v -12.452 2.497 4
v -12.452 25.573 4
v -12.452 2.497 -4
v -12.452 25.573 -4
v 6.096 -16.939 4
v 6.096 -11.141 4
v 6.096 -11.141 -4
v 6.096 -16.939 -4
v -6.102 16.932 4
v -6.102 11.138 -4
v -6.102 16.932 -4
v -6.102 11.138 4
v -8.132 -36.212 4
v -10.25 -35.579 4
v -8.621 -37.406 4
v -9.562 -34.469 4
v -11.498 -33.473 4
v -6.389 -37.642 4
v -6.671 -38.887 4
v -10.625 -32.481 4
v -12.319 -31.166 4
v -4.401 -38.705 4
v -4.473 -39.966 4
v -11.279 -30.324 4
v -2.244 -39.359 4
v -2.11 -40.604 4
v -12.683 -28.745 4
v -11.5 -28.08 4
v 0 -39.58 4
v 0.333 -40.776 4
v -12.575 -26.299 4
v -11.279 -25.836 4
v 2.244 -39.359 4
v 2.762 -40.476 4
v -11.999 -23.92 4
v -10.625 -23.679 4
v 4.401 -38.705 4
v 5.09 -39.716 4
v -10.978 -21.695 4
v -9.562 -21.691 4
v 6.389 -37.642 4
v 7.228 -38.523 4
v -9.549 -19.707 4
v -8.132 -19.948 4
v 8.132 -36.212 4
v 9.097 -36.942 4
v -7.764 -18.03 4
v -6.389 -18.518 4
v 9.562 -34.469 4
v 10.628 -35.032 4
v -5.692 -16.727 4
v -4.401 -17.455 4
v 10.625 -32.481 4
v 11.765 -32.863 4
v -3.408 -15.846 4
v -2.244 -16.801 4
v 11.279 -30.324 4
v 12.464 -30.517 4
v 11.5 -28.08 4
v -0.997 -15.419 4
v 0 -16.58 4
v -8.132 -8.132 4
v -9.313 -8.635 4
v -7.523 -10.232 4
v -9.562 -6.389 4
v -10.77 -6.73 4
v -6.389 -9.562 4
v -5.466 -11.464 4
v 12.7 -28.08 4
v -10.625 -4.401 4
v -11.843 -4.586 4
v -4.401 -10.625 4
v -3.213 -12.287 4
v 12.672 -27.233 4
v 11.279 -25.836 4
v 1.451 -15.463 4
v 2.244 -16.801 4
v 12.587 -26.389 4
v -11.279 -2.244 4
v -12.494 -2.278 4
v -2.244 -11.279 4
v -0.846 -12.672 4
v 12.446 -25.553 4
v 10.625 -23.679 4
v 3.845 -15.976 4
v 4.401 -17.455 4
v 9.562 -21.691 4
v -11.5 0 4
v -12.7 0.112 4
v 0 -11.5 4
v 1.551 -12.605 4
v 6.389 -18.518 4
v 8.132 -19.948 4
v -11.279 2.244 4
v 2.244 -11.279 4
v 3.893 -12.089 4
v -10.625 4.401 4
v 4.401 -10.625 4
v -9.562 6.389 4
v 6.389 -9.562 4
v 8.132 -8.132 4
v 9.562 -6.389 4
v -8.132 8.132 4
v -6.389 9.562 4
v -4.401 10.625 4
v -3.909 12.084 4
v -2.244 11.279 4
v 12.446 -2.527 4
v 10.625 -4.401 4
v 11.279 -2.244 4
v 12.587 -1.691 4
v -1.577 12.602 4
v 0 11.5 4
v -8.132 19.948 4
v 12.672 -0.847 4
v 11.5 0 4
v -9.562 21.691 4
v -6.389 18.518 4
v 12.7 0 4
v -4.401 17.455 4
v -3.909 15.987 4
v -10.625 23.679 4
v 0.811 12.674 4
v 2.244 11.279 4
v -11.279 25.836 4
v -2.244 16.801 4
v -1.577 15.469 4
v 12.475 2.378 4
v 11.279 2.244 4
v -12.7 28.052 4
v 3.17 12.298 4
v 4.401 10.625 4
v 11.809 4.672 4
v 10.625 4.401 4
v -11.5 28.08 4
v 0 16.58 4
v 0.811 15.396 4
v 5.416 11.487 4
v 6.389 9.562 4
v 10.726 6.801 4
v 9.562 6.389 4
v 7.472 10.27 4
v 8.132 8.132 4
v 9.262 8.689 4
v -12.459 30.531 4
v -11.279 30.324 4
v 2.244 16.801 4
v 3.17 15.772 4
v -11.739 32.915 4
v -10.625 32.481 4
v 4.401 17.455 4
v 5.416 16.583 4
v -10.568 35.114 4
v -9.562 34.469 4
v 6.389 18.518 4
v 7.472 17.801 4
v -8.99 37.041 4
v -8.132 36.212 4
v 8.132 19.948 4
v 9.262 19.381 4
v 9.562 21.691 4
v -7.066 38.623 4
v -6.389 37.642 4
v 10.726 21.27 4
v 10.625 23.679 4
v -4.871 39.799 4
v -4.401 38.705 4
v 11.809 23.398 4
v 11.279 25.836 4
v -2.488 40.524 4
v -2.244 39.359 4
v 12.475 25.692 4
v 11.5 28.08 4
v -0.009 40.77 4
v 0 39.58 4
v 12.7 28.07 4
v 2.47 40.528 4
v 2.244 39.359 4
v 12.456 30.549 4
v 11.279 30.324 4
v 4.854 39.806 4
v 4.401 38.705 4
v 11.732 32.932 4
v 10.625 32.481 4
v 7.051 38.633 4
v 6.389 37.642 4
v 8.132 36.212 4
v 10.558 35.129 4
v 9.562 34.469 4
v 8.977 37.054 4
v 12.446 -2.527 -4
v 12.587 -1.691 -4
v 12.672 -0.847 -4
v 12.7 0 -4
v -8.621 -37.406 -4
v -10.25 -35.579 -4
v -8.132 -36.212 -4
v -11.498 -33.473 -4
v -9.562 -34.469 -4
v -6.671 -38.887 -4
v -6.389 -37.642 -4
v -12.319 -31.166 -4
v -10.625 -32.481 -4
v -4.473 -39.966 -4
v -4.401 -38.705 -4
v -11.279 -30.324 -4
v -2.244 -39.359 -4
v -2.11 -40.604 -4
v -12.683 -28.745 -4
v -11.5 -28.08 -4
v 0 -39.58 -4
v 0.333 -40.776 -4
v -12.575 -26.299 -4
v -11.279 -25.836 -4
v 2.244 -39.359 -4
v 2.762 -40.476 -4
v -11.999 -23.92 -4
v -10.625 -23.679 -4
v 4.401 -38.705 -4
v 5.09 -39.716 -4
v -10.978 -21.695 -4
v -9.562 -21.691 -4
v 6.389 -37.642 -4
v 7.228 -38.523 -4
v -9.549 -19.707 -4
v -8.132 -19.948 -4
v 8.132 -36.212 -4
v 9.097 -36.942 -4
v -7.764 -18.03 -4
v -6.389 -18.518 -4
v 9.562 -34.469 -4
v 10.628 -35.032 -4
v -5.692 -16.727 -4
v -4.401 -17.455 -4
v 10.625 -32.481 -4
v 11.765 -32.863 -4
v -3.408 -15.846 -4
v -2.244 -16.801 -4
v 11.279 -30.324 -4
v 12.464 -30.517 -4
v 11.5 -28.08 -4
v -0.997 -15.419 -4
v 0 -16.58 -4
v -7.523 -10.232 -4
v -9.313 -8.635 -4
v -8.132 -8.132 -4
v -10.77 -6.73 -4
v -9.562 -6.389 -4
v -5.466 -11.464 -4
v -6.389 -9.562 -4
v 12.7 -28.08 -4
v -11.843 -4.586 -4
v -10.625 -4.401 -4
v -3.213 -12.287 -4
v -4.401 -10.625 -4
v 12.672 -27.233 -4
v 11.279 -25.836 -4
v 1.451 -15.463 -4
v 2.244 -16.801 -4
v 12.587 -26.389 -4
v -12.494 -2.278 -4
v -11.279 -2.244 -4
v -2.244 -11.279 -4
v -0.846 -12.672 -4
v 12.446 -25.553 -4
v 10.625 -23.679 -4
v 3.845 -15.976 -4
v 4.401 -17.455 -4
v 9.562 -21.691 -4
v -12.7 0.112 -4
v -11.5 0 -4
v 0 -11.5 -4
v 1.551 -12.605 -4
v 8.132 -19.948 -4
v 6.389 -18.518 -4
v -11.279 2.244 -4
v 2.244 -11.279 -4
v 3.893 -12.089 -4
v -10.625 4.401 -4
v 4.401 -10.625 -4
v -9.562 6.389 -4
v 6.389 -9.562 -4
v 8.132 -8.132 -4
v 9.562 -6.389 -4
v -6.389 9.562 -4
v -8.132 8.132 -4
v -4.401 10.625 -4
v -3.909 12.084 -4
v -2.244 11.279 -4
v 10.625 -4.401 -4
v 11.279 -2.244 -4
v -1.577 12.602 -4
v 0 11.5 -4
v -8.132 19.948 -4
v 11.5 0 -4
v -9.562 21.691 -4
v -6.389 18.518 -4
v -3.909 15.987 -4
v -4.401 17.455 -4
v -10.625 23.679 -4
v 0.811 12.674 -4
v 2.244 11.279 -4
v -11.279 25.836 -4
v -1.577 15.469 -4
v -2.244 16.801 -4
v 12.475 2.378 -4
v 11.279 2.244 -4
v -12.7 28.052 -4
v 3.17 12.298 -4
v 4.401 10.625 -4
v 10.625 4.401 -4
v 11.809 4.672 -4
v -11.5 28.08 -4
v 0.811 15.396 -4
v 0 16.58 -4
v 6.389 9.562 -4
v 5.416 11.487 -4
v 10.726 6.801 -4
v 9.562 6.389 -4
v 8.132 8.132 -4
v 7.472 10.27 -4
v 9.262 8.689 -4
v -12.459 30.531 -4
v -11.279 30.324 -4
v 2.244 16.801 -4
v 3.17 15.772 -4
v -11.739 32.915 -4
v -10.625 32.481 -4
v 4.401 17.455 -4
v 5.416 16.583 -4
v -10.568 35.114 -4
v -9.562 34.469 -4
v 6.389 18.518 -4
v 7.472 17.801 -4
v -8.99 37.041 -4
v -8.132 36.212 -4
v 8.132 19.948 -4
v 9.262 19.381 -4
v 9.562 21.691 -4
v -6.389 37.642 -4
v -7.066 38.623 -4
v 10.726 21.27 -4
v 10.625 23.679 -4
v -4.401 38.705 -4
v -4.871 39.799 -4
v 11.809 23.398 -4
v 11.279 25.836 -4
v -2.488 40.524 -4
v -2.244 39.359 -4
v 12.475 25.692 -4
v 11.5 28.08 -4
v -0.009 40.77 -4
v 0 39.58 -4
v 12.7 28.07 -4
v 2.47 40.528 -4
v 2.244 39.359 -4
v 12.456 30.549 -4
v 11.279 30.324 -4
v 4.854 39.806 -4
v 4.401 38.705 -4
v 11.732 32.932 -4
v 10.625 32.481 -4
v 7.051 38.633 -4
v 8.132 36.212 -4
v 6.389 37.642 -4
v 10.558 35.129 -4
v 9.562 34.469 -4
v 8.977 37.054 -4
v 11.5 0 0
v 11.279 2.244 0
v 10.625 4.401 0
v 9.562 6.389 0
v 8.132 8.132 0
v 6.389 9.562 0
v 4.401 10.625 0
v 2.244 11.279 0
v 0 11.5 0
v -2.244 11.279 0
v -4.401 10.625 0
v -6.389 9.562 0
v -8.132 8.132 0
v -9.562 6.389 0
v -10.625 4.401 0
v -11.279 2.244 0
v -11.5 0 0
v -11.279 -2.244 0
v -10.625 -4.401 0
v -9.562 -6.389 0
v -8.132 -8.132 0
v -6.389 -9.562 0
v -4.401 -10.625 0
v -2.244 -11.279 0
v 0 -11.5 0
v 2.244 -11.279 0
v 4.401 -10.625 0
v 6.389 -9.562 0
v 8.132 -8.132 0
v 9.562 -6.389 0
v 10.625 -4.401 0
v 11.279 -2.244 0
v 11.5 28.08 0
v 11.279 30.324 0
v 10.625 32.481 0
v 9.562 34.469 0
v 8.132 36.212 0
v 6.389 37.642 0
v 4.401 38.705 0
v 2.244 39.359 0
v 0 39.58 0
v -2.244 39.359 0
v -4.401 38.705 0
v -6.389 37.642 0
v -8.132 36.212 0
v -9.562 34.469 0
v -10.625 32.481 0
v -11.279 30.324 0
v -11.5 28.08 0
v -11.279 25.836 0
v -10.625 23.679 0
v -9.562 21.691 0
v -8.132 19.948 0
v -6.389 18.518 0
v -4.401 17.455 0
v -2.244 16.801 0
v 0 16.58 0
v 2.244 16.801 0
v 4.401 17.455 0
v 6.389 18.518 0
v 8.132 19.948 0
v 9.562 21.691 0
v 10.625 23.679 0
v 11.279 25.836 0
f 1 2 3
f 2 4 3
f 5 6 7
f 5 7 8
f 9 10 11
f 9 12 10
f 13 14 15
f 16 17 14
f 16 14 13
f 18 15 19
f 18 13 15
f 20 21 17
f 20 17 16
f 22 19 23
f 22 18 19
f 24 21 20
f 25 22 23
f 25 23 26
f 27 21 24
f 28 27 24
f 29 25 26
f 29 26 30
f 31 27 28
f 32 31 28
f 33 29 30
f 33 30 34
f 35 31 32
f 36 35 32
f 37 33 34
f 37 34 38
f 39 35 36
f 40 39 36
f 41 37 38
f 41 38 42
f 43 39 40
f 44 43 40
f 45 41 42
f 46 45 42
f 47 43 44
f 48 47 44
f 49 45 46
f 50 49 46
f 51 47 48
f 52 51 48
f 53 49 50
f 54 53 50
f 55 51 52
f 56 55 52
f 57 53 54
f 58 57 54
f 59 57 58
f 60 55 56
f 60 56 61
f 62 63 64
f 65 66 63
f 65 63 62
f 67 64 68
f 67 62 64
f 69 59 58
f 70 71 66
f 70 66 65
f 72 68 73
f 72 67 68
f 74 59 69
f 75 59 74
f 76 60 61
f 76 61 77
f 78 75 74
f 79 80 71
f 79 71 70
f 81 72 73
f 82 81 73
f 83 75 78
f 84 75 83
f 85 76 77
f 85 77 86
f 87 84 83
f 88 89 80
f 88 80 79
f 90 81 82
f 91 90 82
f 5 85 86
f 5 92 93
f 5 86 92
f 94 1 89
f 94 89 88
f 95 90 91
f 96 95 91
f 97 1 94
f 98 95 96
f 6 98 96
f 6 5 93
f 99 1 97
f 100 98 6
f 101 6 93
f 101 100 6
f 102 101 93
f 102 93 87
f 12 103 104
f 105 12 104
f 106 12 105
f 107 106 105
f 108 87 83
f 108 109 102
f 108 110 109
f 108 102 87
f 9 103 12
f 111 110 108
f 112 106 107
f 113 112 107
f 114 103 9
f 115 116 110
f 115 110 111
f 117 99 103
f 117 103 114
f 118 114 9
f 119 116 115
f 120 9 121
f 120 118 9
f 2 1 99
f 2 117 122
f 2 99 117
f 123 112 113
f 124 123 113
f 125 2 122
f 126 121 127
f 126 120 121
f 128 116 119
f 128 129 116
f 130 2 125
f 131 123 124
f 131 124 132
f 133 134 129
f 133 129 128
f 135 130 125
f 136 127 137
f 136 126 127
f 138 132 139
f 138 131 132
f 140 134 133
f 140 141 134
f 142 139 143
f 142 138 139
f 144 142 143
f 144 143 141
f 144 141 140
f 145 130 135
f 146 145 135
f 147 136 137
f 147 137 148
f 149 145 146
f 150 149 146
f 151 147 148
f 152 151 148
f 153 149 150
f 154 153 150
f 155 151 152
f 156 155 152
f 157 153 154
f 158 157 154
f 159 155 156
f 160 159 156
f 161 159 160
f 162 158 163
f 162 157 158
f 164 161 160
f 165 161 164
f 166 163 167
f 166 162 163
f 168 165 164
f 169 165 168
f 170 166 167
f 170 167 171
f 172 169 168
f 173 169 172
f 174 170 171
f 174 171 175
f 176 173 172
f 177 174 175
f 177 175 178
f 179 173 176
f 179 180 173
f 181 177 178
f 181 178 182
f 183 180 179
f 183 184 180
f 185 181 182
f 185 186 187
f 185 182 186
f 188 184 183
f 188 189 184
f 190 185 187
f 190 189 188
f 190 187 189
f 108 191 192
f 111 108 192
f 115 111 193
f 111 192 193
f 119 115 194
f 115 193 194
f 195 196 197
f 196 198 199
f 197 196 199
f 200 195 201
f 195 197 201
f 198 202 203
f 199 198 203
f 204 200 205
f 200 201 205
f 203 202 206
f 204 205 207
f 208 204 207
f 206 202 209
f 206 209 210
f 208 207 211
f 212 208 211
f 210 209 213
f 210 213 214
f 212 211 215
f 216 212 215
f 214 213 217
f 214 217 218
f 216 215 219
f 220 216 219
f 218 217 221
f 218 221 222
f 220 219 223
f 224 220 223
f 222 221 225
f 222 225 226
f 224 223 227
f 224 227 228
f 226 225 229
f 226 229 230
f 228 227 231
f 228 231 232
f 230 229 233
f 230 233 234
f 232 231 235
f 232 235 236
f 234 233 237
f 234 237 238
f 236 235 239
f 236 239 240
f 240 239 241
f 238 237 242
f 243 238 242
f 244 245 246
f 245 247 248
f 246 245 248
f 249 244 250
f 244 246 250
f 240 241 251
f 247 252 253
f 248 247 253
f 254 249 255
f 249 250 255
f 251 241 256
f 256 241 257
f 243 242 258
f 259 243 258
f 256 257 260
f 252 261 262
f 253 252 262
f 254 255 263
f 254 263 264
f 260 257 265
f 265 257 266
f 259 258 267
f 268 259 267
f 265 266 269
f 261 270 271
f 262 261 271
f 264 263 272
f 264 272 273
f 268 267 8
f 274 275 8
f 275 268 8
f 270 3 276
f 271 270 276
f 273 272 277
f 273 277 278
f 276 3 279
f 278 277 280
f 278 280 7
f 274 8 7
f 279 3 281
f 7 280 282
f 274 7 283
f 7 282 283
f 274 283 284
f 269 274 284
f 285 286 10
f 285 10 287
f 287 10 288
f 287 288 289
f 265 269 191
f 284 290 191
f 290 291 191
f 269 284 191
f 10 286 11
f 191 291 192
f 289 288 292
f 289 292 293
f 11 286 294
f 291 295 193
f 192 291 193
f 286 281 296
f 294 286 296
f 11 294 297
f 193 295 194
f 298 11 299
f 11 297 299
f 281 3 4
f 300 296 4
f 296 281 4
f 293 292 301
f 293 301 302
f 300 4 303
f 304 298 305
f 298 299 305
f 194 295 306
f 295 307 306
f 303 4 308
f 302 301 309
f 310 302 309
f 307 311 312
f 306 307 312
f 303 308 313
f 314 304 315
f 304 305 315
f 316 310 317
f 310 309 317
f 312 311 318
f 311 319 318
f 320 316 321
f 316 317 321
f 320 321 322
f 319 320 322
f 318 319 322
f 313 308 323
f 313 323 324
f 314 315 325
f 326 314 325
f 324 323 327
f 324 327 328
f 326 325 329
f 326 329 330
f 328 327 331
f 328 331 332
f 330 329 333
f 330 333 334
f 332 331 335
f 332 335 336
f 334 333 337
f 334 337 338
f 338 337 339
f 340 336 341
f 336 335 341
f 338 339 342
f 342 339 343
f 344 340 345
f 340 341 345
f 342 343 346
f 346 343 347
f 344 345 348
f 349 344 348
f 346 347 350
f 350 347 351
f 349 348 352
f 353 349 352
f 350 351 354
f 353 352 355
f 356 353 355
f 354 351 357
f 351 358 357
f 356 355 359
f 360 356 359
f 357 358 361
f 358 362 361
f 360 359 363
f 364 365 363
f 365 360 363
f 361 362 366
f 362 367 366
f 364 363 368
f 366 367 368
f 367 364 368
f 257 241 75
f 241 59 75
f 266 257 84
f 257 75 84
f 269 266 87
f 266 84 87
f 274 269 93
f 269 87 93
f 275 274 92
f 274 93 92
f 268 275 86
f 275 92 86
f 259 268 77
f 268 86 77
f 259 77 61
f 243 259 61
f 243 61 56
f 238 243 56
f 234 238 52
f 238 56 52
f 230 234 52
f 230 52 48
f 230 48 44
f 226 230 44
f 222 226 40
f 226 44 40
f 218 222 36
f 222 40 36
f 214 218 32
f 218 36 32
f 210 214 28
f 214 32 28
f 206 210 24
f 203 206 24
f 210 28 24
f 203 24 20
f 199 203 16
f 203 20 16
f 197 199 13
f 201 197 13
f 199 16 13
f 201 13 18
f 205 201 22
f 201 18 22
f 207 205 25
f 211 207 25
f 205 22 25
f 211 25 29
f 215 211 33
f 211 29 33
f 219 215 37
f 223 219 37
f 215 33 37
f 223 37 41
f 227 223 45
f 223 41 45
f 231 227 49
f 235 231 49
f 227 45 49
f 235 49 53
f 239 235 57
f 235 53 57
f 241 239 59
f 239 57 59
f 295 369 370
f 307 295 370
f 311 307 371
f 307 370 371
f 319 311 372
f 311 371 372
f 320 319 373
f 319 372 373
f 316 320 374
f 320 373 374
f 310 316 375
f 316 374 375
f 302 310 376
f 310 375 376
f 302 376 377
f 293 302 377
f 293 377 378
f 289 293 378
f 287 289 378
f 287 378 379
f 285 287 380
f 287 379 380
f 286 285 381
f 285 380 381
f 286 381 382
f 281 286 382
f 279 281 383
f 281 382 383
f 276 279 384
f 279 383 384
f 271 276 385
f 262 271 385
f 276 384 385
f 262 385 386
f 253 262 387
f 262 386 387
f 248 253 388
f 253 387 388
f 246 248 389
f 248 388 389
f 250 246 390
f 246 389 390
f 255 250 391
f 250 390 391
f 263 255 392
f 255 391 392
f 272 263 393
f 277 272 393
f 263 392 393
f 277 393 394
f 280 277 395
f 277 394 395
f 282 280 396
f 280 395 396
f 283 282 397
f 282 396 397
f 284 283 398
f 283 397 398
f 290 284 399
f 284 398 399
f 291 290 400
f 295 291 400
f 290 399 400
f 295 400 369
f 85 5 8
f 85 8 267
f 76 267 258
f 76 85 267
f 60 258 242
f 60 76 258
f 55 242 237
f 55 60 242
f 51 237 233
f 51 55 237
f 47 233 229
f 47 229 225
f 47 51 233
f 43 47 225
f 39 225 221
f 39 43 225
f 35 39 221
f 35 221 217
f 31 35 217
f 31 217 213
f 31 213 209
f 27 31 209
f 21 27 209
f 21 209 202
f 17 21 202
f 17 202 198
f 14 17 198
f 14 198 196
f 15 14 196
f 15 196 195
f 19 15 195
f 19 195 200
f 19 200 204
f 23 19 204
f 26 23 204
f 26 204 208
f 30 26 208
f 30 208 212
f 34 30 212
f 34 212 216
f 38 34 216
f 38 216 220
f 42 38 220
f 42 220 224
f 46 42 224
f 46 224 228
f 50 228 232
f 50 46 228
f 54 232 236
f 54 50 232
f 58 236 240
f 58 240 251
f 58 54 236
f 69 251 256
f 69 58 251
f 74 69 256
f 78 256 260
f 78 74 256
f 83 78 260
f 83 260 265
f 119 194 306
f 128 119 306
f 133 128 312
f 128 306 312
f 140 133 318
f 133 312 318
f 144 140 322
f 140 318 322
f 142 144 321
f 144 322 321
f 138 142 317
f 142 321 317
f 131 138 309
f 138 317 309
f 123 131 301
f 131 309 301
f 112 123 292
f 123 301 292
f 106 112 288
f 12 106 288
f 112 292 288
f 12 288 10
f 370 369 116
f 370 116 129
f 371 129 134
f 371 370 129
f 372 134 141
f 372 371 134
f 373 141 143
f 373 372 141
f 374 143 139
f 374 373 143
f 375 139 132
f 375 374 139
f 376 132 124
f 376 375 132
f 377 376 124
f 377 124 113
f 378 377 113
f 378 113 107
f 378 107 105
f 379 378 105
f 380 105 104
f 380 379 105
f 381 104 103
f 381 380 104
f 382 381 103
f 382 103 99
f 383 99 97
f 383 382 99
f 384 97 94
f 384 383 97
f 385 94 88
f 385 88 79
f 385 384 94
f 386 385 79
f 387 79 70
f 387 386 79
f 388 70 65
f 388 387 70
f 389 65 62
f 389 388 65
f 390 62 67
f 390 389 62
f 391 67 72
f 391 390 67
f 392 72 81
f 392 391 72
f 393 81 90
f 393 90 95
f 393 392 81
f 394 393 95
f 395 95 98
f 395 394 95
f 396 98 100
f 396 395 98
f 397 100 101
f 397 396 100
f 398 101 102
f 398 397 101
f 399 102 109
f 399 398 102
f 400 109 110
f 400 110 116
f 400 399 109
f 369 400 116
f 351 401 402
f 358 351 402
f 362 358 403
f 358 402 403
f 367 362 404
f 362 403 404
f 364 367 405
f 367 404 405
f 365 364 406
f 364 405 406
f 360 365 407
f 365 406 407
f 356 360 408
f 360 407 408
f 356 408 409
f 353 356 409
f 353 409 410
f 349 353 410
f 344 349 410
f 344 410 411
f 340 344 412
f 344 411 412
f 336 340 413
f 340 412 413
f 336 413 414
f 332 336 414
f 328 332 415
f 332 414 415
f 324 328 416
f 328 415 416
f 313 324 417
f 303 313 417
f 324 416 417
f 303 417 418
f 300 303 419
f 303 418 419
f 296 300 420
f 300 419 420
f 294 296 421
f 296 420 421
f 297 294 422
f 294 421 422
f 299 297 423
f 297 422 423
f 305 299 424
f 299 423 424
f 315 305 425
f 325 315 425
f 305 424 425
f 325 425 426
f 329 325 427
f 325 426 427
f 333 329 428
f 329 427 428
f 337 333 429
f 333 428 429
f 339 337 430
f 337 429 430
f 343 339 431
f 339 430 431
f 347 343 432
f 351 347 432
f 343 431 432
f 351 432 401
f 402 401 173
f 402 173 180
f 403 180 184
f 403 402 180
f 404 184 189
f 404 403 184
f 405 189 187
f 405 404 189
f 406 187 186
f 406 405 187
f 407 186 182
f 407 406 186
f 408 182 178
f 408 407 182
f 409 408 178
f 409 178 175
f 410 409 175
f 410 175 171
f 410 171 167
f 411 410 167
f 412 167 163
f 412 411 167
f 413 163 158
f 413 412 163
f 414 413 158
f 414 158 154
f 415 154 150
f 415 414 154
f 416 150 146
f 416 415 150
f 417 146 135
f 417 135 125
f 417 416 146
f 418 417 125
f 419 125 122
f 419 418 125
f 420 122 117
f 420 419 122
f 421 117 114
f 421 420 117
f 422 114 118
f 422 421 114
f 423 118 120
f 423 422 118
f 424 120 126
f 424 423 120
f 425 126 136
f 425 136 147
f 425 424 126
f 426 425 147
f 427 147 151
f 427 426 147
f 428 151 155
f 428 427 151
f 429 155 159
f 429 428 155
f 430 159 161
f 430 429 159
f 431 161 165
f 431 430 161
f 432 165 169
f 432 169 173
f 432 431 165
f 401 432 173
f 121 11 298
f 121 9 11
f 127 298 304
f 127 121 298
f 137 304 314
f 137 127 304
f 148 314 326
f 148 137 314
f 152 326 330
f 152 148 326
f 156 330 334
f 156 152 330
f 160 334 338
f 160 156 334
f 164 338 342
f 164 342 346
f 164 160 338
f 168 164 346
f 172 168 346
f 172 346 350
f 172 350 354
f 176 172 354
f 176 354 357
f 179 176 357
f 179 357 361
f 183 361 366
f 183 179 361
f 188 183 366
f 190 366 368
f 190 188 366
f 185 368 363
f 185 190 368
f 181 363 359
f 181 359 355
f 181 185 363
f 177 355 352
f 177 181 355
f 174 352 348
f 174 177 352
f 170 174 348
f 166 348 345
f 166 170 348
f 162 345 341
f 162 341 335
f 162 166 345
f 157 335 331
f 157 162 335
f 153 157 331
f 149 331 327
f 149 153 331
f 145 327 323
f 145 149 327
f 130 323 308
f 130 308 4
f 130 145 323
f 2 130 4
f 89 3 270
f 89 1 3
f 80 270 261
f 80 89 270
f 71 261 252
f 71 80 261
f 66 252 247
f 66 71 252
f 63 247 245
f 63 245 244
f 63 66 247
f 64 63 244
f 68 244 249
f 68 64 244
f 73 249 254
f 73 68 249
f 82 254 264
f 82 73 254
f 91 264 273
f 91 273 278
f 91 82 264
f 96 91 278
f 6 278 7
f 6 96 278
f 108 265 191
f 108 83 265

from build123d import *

# Parameters (mm, degrees)
F2_DEPTH = 4
F0_R     = 11.5
F3_DEPTH = 4


with BuildPart() as f2:
    # F1 (on Top) → F2 (new body, symmetric)
    with BuildSketch(Plane.XY):
        with BuildLine():
            Line((-12.4521264806, 25.5733730193), (-12.4521264806, 28.0924))
            Line((-12.4521264806, 28.0924), (-6.1021264806, 28.0924))
            Line((-6.1021264806, 28.0924), (-6.1021264806, 16.9323248421))
            ThreePointArc((-6.1021264806, 16.9323248421), (6.472750331, 17.143546912), (12.7, 28.0702803284))
            ThreePointArc((12.7, 28.0702803284), (-1.2545903108, 40.7081600221), (-12.4521264806, 25.5733730193))
        make_face()
        with BuildLine():
            Line((-6.1021264806, 28.0924), (-12.4521264806, 28.0924))
            Line((-12.4521264806, 28.0924), (-12.4521264806, 25.5733730193))
            ThreePointArc((-12.4521264806, 25.5733730193), (-10.2338655521, 20.5497753013), (-6.1021264806, 16.9323248421))
            Line((-6.1021264806, 16.9323248421), (-6.1021264806, 28.0924))
        make_face()
        with BuildLine():
            ThreePointArc((-6.1021264806, 16.9323248421), (-10.2338655521, 20.5497753013), (-12.4521264806, 25.5733730193))
            Line((-12.4521264806, 25.5733730193), (-12.4521264806, 2.4969073091))
            ThreePointArc((-12.4521264806, 2.4969073091), (-10.2338655521, 7.5205050271), (-6.1021264806, 11.1379554863))
            Line((-6.1021264806, 11.1379554863), (-6.1021264806, 16.9323248421))
        make_face()
        with BuildLine():
            ThreePointArc((-6.1021264806, 11.1379554863), (-10.2338655521, 7.5205050271), (-12.4521264806, 2.4969073091))
            Line((-12.4521264806, 2.4969073091), (-12.4521264806, 0))
            Line((-12.4521264806, 0), (-6.1021264806, 0))
            Line((-6.1021264806, 0), (-6.1021264806, 11.1379554863))
        make_face()
        with BuildLine():
            Line((-12.4521264806, 0), (-12.4521264806, 2.4969073091))
            ThreePointArc((-12.4521264806, 2.4969073091), (-7.5233189099, -10.2317971335), (6.096, -11.1413097973))
            Line((6.096, -11.1413097973), (6.096, 0))
            Line((6.096, 0), (12.446, 0))
            Line((12.446, 0), (12.446, -2.5272680903))
            ThreePointArc((12.446, -2.5272680903), (12.6363404513, -1.27), (12.7, 0))
            ThreePointArc((12.7, 0), (6.472750331, 10.9267334164), (-6.1021264806, 11.1379554863))
            Line((-6.1021264806, 11.1379554863), (-6.1021264806, 0))
            Line((-6.1021264806, 0), (-12.4521264806, 0))
        make_face()
        with BuildLine():
            ThreePointArc((12.446, -2.5272680903), (10.2226155965, -7.535789963), (6.096, -11.1413097973))
            Line((6.096, -11.1413097973), (6.096, -16.9388947044))
            ThreePointArc((6.096, -16.9388947044), (10.2226155965, -20.5444145387), (12.446, -25.5529364115))
            Line((12.446, -25.5529364115), (12.446, -2.5272680903))
        make_face()
        with BuildLine():
            Line((6.096, 0), (6.096, -11.1413097973))
            ThreePointArc((6.096, -11.1413097973), (10.2226155965, -7.535789963), (12.446, -2.5272680903))
            Line((12.446, -2.5272680903), (12.446, 0))
            Line((12.446, 0), (6.096, 0))
        make_face()
        with BuildLine():
            ThreePointArc((12.446, -25.5529364115), (10.2226155965, -20.5444145387), (6.096, -16.9388947044))
            Line((6.096, -16.9388947044), (6.096, -28.0924))
            Line((6.096, -28.0924), (12.446, -28.0924))
            Line((12.446, -28.0924), (12.446, -25.5529364115))
        make_face()
        with BuildLine():
            Line((6.096, -28.0924), (6.096, -16.9388947044))
            ThreePointArc((6.096, -16.9388947044), (-10.9249530891, -34.555959284), (12.7, -28.0802045017))
            ThreePointArc((12.7, -28.0802045017), (12.6363404513, -26.8102045017), (12.446, -25.5529364115))
            Line((12.446, -25.5529364115), (12.446, -28.0924))
            Line((12.446, -28.0924), (6.096, -28.0924))
        make_face()
    extrude(amount=F2_DEPTH, both=True)

    # F0 (on Top) → F3 (cut, symmetric)
    with BuildSketch(Plane.XY):
        Circle(F0_R)
        with Locations((0, 28.08)):
            Circle(F0_R)
        with Locations((0, -28.08)):
            Circle(F0_R)
    extrude(amount=F3_DEPTH, both=True, mode=Mode.SUBTRACT)


solid = f2.part
